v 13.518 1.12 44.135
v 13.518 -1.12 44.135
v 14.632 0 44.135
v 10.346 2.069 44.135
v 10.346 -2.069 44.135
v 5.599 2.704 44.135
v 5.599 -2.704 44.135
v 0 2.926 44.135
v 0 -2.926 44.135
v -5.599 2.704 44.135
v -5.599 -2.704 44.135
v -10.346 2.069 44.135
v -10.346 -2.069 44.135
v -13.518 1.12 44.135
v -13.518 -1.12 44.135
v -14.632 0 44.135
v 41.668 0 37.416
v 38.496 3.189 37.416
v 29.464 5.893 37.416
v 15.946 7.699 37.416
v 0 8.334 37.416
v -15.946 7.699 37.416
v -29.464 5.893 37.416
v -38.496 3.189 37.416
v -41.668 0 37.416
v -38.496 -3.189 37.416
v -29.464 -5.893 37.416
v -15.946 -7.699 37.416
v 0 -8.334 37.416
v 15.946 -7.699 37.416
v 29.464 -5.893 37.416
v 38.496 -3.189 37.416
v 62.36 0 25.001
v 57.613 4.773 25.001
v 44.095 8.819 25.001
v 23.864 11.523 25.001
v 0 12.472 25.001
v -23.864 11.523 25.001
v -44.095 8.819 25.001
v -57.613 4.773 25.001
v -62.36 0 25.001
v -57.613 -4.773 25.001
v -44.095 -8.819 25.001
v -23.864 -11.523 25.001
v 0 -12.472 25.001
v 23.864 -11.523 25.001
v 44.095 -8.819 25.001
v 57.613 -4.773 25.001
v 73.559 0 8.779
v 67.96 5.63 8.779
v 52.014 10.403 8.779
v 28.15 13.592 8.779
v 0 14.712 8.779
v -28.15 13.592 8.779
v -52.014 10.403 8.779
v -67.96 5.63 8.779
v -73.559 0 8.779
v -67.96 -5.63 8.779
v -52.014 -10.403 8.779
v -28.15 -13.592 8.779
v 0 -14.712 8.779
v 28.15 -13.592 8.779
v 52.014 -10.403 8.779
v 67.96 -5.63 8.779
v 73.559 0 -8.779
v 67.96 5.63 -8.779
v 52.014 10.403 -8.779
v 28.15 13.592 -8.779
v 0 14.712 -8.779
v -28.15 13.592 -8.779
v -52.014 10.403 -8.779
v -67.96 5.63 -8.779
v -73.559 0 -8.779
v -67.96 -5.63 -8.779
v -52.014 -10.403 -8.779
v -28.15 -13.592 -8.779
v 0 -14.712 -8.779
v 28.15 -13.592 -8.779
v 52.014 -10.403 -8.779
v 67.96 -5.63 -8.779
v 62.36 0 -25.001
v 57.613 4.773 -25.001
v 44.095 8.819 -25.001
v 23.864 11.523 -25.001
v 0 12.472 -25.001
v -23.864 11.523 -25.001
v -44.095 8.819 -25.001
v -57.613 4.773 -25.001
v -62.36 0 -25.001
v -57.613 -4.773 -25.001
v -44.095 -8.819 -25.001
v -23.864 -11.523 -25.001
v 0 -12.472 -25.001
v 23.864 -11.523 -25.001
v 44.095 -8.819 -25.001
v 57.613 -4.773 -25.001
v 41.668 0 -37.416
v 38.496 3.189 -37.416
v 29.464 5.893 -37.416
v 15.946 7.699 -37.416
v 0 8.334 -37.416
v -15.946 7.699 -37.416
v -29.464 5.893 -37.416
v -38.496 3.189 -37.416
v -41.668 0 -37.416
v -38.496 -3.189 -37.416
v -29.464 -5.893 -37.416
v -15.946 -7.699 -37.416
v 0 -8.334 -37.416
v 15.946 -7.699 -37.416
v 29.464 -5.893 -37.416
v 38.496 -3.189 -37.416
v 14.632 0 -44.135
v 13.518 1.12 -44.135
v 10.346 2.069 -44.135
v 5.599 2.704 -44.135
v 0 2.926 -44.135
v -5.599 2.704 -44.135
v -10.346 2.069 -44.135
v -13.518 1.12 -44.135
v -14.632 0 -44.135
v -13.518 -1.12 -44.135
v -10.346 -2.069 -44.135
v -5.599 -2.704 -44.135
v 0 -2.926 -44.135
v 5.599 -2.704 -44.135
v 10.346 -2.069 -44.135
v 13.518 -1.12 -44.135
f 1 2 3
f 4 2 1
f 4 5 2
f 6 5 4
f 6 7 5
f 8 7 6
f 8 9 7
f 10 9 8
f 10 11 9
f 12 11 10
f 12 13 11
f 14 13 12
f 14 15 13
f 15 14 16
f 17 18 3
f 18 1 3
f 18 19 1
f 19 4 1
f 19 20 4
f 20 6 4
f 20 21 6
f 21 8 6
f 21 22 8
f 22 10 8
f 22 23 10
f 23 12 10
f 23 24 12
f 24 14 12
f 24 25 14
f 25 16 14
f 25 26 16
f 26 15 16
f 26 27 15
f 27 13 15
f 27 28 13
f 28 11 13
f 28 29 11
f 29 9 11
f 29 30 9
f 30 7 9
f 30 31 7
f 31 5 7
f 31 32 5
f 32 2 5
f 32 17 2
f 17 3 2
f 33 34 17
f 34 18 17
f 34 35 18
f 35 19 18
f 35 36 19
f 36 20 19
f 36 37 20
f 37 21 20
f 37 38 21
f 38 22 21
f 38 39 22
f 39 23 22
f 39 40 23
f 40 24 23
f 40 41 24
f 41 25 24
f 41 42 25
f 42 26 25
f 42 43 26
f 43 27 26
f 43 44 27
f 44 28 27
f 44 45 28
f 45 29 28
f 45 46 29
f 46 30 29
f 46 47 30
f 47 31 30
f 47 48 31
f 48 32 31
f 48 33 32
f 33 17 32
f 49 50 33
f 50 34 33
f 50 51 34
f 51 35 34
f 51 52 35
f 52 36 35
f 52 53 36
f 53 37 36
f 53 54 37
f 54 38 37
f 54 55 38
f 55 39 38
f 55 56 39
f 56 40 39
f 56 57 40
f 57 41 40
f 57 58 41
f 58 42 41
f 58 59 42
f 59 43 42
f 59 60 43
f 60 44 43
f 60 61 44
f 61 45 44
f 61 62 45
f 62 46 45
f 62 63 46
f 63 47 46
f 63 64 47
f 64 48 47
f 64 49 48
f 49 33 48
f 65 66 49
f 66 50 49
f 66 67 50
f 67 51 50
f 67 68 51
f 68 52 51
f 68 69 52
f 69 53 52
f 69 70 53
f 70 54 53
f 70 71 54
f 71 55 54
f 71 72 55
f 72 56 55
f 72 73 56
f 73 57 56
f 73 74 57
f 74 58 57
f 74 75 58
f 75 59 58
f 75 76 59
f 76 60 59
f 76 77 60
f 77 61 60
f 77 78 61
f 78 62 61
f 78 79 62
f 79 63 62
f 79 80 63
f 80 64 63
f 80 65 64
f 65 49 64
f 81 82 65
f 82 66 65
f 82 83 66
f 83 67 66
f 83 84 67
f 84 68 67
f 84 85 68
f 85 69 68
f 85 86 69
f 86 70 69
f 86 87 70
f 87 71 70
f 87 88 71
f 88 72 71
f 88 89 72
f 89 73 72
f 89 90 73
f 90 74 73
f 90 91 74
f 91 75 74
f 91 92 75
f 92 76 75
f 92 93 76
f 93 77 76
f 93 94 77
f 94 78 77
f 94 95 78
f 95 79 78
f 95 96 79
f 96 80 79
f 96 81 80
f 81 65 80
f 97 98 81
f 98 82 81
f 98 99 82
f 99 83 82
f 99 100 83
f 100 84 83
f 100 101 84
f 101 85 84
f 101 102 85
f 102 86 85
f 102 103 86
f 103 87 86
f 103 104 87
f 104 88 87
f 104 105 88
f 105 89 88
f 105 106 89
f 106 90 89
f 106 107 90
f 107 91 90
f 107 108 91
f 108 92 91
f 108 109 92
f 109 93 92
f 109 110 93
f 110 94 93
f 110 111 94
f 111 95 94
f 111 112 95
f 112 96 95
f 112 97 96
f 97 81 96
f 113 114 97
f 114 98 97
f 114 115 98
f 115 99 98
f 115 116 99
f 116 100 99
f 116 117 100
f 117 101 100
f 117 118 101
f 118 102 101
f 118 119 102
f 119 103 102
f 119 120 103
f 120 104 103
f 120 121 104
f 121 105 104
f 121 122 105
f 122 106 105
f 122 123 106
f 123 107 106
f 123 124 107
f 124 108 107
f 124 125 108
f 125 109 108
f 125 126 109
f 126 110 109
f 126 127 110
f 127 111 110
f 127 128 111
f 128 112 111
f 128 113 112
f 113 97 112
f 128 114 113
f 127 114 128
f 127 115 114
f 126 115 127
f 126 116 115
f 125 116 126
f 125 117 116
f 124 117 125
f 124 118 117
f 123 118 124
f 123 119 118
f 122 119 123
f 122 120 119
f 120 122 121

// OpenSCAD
// Generated by SolidPython 1.0.1 on 2020-07-29 00:46:51


scale(v = [15, 3, 9]) {
	sphere(r = 5);
}
/***********************************************
*********      SolidPython code:      **********
************************************************
 
# import packages: SolidPython
from solid import *
from solid.utils import *
from itertools import chain, combinations, permutations


class Resize:

    def __init__(self, scad_file):
        self.scad_file = scad_file
        #self.scad_file = import_scad(scad_file)
        # cone/cylinder param:
        self.r1 = 0
        self.r2 = 0
        self.h = 0
        # rectangular prism param:
        self.w = 0
        self.l = 0
        # ellipse param:
        self.r = 0

    # import OpenScad code (file name corresponds to shape)


    # classify shape + parameters
    def assign(self, param1, param2, param3):
        if self.scad_file == 'cone.scad':
            self.r1 = param1
            self.r2 = param2
            self.h = param3
        elif self.scad_file == 'cylinder.scad':
            self.r1 = param1
            self.r2 = param2
            self.h = param3
        elif self.scad_file == 'rectangularPrism.scad':
            self.h = param1
            self.l = param2
            self.w = param3
        else:
            self.r = param1
            self.h = param2

    # resize parameters
    def iterate(self):
        x = range(3, 20, 2)
        i = 1
        if self.scad_file == 'cone.scad':
            tempList = list(permutations(x, 2))
            for temp in tempList:
                param1 = temp[0]
                param2 = temp[1]
                filepath = 'produced_scad_files/' + 'cone' + str(param1) + '_' + str(param2) + '_' + '.scad'
                scad_render_to_file(cylinder(h=param1, r1=param2, r2=0), filepath)

        elif self.scad_file == 'cylinder.scad':
            tempList = list(permutations(x, 3))
            for temp in tempList:
                param1 = temp[0]
                param2 = temp[1]
                filepath = 'produced_scad_files/' + 'cylinder' + str(param1) + '_' + str(param2) + '_' + '.scad'
                scad_render_to_file(cylinder(h=param1, r1=param2, r2=param2), filepath)

        elif self.scad_file == 'rectangularPrism.scad':
            tempList = list(permutations(x, 3))
            for temp in tempList:
                param1 = temp[0]
                param2 = temp[1]
                param3 = temp[2]
                filepath = 'produced_scad_files/' + 'rectangularPrism' + str(param1) + '_' + str(param2) + '_' + str(
                    param3) + '.scad'
                scad_render_to_file(cube(size=(param1, param2, param3)), filepath)

        elif self.scad_file == 'ellipse.scad':
            tempList = list(permutations(x, 4))
            for temp in tempList:
                param1 = temp[0]
                param2 = temp[1]
                param3 = temp[2]
                param4 = temp[3]
                filepath = 'produced_scad_files/' + 'ellipse' + str(param1) + '_' + str(param2) + '_' + str(param3) + '_' + str(param4) + '.scad'
                scad_render_to_file(scale([param1, param2, param3])(sphere(r=param4)), filepath)

    def render_to_scadfile(self):
        scad_render_to_file(scad, 'example.scad') 
 
************************************************/
